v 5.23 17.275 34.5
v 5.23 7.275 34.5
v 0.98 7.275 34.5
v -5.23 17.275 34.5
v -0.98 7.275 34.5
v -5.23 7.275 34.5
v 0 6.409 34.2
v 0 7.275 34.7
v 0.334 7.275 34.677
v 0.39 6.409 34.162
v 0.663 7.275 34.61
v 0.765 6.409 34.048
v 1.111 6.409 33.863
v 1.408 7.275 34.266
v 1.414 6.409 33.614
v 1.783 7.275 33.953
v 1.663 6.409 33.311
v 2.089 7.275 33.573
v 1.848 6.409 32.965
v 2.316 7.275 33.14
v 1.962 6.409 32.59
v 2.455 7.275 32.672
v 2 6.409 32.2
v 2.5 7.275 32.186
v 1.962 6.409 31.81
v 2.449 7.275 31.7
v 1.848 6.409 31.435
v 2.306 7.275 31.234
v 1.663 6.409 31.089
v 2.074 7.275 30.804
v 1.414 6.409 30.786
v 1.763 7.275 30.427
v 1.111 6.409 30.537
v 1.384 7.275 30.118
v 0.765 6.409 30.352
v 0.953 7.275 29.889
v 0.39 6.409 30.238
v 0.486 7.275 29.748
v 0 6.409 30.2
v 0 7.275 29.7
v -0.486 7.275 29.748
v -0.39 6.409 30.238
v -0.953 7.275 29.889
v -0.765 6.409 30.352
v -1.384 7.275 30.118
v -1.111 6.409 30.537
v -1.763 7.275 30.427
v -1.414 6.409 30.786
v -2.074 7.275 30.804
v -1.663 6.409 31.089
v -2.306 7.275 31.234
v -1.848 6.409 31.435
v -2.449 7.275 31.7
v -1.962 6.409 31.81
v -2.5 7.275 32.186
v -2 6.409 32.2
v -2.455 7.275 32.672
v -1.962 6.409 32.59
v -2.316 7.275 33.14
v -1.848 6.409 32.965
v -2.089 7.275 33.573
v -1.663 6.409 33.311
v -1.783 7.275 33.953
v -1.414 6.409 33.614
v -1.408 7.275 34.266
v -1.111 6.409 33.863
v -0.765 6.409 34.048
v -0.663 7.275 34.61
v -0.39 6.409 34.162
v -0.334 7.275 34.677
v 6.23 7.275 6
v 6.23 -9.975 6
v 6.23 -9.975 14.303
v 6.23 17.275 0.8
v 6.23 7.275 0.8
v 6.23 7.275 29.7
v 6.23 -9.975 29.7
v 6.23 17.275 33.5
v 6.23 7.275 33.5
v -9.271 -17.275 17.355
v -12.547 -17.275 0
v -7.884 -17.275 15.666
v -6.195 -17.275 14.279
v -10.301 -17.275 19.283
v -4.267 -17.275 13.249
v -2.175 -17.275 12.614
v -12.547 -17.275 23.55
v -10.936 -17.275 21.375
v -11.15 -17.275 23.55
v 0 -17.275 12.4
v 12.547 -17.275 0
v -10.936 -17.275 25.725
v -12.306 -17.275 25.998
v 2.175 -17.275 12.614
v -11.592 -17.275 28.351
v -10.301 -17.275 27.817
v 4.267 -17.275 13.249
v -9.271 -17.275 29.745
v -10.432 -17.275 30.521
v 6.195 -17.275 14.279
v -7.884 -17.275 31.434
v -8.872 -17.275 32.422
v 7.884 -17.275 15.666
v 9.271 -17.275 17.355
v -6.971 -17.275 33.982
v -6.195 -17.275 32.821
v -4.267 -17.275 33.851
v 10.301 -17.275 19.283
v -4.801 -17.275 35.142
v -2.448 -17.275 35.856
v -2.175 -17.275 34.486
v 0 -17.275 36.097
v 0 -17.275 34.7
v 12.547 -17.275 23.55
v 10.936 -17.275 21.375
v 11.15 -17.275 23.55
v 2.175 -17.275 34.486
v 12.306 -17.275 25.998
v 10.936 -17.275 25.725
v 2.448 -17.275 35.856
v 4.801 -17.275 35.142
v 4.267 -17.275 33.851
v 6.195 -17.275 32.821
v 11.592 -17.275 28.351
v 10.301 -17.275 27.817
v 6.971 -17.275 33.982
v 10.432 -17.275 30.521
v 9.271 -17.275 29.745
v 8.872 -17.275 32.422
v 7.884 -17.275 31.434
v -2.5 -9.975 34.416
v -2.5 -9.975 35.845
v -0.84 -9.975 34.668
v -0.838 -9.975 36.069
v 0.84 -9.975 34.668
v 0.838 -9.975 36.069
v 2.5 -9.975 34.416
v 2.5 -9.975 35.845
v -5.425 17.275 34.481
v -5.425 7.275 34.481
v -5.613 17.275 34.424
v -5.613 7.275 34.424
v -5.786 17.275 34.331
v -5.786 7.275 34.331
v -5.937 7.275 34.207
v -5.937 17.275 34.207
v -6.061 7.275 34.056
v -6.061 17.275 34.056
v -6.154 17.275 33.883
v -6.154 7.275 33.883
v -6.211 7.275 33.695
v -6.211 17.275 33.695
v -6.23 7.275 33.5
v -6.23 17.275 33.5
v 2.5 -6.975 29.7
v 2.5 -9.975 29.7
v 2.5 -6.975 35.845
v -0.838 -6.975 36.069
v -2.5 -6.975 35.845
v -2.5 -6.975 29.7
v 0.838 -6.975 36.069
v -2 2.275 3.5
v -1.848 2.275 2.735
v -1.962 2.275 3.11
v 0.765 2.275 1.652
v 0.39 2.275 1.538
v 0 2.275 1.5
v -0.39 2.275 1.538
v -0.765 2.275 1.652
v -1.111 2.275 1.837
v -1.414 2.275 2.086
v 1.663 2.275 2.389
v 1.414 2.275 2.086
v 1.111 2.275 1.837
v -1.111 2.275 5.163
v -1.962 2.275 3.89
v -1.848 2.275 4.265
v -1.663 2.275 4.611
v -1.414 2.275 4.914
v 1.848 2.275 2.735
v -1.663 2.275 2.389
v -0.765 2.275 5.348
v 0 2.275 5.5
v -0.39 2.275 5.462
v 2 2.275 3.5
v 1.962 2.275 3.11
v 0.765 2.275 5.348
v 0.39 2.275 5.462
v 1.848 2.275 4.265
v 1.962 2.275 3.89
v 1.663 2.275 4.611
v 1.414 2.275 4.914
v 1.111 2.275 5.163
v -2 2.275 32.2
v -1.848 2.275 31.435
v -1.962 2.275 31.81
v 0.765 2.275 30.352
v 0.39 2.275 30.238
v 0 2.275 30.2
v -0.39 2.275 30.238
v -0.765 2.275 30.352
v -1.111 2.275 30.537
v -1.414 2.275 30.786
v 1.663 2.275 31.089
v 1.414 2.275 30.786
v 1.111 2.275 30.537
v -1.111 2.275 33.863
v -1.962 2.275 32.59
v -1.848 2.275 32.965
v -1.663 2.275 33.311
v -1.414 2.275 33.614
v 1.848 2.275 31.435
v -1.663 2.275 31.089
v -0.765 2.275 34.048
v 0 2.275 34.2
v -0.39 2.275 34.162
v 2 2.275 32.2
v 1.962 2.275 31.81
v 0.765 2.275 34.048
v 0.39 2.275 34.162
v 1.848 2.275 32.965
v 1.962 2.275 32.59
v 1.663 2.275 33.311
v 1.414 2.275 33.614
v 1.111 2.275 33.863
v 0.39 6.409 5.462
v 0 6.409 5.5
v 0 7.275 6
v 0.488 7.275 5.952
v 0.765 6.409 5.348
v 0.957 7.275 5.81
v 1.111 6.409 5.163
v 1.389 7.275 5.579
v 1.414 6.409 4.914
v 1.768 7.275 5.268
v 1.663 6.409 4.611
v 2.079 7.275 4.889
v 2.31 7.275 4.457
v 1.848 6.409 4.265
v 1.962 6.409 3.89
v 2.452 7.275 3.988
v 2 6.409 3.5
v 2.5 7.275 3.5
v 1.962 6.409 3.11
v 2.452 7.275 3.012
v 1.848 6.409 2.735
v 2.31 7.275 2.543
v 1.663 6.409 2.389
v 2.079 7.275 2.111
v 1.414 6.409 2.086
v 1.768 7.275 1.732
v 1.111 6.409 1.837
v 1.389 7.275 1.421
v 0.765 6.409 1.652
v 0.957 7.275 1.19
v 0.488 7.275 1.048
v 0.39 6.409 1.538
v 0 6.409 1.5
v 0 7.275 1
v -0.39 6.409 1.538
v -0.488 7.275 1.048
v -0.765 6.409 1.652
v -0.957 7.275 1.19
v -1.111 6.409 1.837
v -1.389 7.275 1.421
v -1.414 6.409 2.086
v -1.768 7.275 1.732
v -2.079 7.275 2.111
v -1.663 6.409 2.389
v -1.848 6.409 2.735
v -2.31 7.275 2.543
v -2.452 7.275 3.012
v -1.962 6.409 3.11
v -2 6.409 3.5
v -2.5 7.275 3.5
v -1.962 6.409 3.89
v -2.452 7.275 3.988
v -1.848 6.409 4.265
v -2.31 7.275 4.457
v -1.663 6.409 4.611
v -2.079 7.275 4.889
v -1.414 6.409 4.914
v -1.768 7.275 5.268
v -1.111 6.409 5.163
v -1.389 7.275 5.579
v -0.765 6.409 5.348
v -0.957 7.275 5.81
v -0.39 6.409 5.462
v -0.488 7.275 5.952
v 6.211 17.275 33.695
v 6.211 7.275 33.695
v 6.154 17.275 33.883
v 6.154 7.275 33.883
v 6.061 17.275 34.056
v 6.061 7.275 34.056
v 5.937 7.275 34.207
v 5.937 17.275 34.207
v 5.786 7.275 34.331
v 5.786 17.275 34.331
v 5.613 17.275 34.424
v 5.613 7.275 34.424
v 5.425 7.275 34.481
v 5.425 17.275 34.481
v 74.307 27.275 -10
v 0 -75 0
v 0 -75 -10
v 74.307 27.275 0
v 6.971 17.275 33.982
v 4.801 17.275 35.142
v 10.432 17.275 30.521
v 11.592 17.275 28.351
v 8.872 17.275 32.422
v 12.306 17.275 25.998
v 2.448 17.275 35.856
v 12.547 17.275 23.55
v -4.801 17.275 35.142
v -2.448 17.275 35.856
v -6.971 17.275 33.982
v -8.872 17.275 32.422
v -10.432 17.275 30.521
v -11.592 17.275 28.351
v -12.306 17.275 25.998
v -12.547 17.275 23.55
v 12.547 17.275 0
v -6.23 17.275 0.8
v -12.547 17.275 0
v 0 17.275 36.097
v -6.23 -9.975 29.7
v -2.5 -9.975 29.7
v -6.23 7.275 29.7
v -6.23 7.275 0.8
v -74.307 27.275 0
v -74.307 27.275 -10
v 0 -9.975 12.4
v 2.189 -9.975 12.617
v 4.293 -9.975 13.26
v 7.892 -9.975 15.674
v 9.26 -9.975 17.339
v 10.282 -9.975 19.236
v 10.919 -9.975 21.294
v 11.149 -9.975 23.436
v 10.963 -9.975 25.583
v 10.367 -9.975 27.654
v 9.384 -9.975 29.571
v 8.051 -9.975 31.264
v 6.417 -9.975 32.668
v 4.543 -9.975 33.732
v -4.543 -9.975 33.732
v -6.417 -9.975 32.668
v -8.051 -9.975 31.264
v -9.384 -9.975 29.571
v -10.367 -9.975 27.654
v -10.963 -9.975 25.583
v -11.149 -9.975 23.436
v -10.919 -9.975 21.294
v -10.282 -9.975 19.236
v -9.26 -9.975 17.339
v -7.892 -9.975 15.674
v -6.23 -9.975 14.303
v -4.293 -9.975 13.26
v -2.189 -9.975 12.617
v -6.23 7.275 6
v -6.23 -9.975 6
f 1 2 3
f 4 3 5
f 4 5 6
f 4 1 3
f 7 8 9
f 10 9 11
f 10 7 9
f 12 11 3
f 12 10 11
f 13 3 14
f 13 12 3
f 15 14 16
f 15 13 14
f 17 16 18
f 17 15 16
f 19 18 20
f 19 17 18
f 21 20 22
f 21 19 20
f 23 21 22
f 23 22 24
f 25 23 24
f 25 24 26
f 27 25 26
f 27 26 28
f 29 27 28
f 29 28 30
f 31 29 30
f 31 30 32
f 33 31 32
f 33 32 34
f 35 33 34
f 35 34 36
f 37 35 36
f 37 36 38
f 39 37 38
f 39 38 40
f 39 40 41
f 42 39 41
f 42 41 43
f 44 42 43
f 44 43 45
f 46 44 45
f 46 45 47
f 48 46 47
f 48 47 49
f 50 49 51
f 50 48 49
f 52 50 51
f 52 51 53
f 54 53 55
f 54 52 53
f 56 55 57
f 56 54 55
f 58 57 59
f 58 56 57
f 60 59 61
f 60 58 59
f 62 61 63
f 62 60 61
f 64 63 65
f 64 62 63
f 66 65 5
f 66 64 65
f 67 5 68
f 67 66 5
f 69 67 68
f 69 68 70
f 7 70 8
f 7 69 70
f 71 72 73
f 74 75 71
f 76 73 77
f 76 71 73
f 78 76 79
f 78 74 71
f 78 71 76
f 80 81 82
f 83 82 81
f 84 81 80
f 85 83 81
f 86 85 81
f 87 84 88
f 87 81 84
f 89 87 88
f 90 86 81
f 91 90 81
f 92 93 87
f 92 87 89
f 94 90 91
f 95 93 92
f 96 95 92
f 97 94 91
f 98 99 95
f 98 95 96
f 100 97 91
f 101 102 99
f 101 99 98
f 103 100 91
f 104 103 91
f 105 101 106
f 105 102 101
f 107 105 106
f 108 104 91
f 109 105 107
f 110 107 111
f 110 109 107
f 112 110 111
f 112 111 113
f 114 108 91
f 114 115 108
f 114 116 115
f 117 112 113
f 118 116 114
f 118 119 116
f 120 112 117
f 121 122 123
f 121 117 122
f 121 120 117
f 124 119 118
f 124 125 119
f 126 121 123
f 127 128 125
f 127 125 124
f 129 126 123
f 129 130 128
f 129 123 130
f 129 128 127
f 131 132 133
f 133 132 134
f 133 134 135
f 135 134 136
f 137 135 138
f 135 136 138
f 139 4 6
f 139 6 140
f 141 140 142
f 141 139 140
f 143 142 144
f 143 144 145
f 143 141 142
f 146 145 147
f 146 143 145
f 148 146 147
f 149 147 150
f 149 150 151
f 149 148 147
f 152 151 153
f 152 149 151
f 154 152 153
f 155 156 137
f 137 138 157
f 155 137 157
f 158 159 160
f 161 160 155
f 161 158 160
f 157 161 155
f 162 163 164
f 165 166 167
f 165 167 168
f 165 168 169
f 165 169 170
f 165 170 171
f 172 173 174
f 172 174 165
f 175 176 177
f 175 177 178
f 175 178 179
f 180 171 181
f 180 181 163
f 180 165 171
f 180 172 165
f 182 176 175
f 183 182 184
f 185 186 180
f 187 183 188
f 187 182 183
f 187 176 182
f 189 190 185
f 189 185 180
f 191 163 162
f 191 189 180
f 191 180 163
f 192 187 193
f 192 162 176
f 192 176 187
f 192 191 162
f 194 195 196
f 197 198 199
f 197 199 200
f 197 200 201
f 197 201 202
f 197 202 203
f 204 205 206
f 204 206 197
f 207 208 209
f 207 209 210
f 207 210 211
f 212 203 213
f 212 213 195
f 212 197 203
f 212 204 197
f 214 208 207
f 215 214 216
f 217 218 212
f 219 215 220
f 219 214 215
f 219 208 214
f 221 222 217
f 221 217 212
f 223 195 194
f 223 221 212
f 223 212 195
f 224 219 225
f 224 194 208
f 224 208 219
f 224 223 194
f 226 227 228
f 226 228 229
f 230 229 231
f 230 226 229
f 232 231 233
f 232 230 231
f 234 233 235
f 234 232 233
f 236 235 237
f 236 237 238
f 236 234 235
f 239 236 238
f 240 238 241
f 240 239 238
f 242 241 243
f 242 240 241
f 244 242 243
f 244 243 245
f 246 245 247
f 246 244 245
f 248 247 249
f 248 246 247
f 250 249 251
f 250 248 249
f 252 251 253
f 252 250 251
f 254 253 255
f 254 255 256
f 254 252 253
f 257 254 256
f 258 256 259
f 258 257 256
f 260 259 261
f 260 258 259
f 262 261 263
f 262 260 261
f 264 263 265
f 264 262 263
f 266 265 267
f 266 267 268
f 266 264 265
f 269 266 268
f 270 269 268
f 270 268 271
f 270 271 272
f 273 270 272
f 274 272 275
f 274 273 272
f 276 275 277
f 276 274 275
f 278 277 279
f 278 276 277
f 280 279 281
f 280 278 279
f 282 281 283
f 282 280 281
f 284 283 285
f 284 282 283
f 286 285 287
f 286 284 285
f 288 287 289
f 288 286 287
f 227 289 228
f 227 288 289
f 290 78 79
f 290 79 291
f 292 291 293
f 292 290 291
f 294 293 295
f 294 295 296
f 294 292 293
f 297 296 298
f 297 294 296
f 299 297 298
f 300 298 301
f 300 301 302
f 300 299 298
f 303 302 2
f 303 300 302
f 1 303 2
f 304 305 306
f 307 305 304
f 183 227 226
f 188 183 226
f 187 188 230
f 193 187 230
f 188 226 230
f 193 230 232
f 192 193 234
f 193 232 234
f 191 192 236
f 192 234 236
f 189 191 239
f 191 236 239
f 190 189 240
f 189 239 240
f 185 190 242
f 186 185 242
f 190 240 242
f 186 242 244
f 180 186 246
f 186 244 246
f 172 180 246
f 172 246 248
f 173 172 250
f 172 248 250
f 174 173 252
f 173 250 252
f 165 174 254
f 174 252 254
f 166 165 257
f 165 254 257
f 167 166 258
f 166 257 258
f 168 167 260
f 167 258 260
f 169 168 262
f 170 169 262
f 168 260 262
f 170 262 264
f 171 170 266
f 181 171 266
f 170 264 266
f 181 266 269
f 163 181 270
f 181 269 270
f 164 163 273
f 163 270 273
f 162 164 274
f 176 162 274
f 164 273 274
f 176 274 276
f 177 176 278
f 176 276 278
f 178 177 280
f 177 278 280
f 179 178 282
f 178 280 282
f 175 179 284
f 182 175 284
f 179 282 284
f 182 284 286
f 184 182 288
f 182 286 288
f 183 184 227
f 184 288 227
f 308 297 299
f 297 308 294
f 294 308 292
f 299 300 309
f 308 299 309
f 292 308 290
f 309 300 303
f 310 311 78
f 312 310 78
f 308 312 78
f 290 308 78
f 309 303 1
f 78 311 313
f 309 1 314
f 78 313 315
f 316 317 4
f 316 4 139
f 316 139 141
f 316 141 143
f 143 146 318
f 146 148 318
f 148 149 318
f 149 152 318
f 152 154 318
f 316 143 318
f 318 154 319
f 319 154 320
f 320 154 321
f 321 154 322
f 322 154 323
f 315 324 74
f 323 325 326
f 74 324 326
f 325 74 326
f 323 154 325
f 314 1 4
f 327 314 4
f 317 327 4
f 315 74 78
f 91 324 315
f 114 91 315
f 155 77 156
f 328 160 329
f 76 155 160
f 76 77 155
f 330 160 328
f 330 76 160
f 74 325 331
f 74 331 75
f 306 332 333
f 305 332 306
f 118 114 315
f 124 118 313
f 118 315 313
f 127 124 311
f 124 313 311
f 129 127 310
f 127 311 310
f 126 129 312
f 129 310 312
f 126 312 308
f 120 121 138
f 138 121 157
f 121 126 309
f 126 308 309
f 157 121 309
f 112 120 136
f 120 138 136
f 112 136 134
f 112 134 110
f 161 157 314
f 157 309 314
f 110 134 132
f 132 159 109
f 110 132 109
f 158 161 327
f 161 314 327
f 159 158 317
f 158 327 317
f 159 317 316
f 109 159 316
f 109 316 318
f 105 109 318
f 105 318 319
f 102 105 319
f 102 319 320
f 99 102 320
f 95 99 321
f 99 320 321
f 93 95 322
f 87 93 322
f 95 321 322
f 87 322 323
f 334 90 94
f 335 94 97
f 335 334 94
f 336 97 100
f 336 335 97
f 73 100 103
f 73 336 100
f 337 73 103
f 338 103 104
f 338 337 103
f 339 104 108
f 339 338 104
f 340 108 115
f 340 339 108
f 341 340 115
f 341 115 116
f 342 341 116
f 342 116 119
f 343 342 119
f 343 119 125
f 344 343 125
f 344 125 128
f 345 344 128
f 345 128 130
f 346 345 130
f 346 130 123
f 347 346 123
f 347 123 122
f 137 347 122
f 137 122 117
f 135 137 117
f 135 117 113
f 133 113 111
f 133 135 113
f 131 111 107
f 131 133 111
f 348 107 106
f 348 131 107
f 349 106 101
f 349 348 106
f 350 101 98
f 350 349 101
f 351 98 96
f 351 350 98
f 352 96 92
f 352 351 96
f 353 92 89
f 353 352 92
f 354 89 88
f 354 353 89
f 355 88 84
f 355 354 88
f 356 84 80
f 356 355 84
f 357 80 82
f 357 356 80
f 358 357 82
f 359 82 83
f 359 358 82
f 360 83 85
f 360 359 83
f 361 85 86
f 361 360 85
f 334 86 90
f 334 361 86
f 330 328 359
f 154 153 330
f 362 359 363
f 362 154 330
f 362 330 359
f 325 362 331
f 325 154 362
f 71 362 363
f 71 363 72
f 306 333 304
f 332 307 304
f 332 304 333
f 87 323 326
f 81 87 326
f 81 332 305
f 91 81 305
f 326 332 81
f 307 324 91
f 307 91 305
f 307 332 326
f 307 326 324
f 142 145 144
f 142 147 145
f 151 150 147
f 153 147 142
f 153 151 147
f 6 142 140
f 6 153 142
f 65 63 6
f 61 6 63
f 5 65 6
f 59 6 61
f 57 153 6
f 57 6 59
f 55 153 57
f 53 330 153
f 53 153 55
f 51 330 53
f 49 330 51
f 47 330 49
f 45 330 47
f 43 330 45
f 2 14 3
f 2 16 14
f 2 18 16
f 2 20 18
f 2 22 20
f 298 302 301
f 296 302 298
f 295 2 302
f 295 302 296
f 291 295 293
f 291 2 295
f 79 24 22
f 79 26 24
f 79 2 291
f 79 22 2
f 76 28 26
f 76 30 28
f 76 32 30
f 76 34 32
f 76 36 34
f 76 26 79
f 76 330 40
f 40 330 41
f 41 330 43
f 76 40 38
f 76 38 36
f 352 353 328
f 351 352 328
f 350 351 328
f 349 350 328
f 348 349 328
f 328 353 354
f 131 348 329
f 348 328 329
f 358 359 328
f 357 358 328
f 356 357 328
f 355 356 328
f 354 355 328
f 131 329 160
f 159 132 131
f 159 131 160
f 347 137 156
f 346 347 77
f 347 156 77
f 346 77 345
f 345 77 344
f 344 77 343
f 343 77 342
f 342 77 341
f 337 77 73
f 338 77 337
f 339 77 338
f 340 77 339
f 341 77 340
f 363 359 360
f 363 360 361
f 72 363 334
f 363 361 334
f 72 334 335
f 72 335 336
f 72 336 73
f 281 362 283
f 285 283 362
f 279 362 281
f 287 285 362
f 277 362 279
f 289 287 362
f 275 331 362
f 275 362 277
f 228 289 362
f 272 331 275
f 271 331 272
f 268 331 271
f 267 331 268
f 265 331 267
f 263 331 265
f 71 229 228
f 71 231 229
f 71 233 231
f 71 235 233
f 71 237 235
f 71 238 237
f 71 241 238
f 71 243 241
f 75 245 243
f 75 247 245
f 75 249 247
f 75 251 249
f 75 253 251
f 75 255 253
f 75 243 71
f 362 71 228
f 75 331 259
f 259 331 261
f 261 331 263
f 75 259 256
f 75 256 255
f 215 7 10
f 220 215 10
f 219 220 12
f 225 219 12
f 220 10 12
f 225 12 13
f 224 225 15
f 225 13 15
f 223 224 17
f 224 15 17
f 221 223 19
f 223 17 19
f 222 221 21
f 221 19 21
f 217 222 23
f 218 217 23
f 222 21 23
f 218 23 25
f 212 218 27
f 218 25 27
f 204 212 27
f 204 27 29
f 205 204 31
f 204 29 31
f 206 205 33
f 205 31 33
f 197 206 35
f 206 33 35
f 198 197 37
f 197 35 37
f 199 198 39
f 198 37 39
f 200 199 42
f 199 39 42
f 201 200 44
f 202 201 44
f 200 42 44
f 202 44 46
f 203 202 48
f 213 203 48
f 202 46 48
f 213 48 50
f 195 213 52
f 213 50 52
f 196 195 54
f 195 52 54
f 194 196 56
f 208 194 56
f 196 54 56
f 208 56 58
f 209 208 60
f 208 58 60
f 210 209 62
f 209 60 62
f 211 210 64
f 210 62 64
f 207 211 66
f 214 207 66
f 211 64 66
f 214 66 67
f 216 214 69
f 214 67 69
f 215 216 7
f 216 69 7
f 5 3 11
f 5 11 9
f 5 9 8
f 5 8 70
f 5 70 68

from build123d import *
from OCP.BRepFilletAPI import BRepFilletAPI_MakeChamfer

# Parameters (mm, degrees)
SKETCH4_W                = 12.46
SKETCH4_H                = 17.25
BOSS_EXTRUDE3_DEPTH      = 6
BOSS_EXTRUDE6_DEPTH      = 7.3
BOSS_EXTRUDE6_DEPTH_BACK = 17.25
SKETCH8_R                = 12.546781182
SKETCH8_R_2              = 11.15
BOSS_EXTRUDE4_DEPTH      = 17.25
SKETCH6_R                = 2
CUT_EXTRUDE1_DEPTH       = 5
CHAMFER1_SIZE            = 0.5
CHAMFER1_SIZE_2          = 0.866025404
SKETCH10_W               = 12.46
SKETCH10_H               = 23.7
CUT_EXTRUDE3_DEPTH       = 17.25
CUT_EXTRUDE4_REACH       = 43.938
SKETCH11_W               = 5
SKETCH11_H               = 3
BOSS_EXTRUDE7_START      = -7.3
BOSS_EXTRUDE7_DEPTH      = 7.3
BOSS_EXTRUDE9_START      = 10
BOSS_EXTRUDE9_DEPTH      = 10
OFFSET_R_DEPTH           = 10


with BuildPart() as part:
    # Sketch4 → Boss-Extrude3 (new body)
    with BuildSketch(Plane.XY):
        with Locations((0, -1.35)):
            Rectangle(SKETCH4_W, SKETCH4_H)
    extrude(amount=BOSS_EXTRUDE3_DEPTH)



with BuildPart() as body_2:
    # Sketch8 → Boss-Extrude6 (new, two sides: drawn at the far end of the back side and taken through both)
    with BuildSketch(Plane(origin=(0, -9.975, 0), x_dir=(-1, 0, 0), z_dir=(0, -1, 0)).offset(-BOSS_EXTRUDE6_DEPTH_BACK)):
        with Locations(Location((0, -23.55, 0), (0, 0, 90))):
            Circle(SKETCH8_R)
        with Locations(Location((0, -23.55, 0), (0, 0, 90))):
            Circle(SKETCH8_R_2, mode=Mode.SUBTRACT)
    extrude(amount=BOSS_EXTRUDE6_DEPTH + BOSS_EXTRUDE6_DEPTH_BACK)


with BuildPart() as part_1:
    add(part.part)

    add(body_2.part)  # Boss-Extrude4 merges body 2
    # Sketch5 → Boss-Extrude4 (add)
    with BuildSketch(Plane(origin=(0, 7.275, 0), x_dir=(1, 0, 0), z_dir=(0, 1, 0))):
        with BuildLine():
            Line((12.546781182, -23.55), (12.546781182, 0))
            Line((12.546781182, 0), (6.23, 0))
            Line((6.23, 0), (6.23, -29.7))
            Line((6.23, -29.7), (-6.23, -29.7))
            Line((-6.23, -29.7), (-6.23, 0))
            Line((-6.23, 0), (-12.546781182, 0))
            Line((-12.546781182, 0), (-12.546781182, -23.55))
            ThreePointArc((-12.546781182, -23.55), (0, -36.096781182), (12.546781182, -23.55))
        make_face()
    extrude(amount=-BOSS_EXTRUDE4_DEPTH)

    # Sketch6 → Cut-Extrude1 (cut)
    with BuildSketch(Plane(origin=(0, 7.275, 0), x_dir=(1, 0, 0), z_dir=(0, 1, 0))):
        with Locations(Location((0, -3.5, 0), (0, 0, 270))):
            Circle(SKETCH6_R)
        with Locations(Location((0, -32.2, 0), (0, 0, 270))):
            Circle(SKETCH6_R)
    extrude(amount=-CUT_EXTRUDE1_DEPTH, mode=Mode.SUBTRACT)

    # Chamfer1
    chamfer1_edges_1 = [part_1.edges().sort_by_distance(p)[0] for p in [
        (0, 7.275, 1.5),
    ]]
    chamfer1_side_1 = [part_1.faces().sort_by_distance(p)[0] for p in [
        (0, 7.275, 1.49),
    ]]
    chamfer1_edges_2 = [part_1.edges().sort_by_distance(p)[0] for p in [
        (0, 7.275, 30.2),
    ]]
    chamfer1_side_2 = [part_1.faces().sort_by_distance(p)[0] for p in [
        (0, 7.275, 30.19),
    ]]
    chamfer1 = BRepFilletAPI_MakeChamfer(part_1.part.solid().wrapped)
    for e in chamfer1_edges_1:
        chamfer1.Add(CHAMFER1_SIZE - 0.0001, CHAMFER1_SIZE_2 - 0.0001, e.wrapped, chamfer1_side_1[0].wrapped)
    for e in chamfer1_edges_2:
        chamfer1.Add(CHAMFER1_SIZE - 0.0001, CHAMFER1_SIZE_2 - 0.0001, e.wrapped, chamfer1_side_2[0].wrapped)
    add(Compound.cast(chamfer1.Shape()), mode=Mode.REPLACE)  # a hair under: the kernel refuses the full size

    # Sketch10 → Cut-Extrude3 (cut)
    with BuildSketch(Plane(origin=(0, 7.275, 0), x_dir=(1, 0, 0), z_dir=(0, 1, 0))):
        with Locations((0, -17.85)):
            Rectangle(SKETCH10_W, SKETCH10_H)
    extrude(amount=-CUT_EXTRUDE3_DEPTH, mode=Mode.SUBTRACT)

    # Sketch11 → Cut-Extrude4 (cut, up to next)
    with BuildSketch(Plane.XY.offset(36.096781182), mode=Mode.PRIVATE) as cut_extrude4_sk1:
        with Locations((0, -8.475)):
            Rectangle(SKETCH11_W, SKETCH11_H)
    cut_extrude4_tool1 = extrude(cut_extrude4_sk1.sketch, amount=-CUT_EXTRUDE4_REACH, mode=Mode.PRIVATE) & part_1.part
    add(cut_extrude4_tool1.solids().sort_by_distance((0, -8.475, 36.096781))[0], mode=Mode.SUBTRACT)

    # Sketch13 → Boss-Extrude7 (add)
    with BuildSketch(Plane.XZ.offset(17.275).offset(BOSS_EXTRUDE7_START)):
        with BuildLine():
            Line((-12.546781182, 23.55), (-12.546781182, 0))
            Line((-12.546781182, 0), (12.546781182, 0))
            Line((12.546781182, 0), (12.546781182, 23.55))
            ThreePointArc((12.546781182, 23.55), (0, 11.003218818), (-12.546781182, 23.55))
        make_face()
    extrude(amount=BOSS_EXTRUDE7_DEPTH)

    # Sketch15 → Boss-Extrude9 (add)
    with BuildSketch(Plane(origin=(0, 7.275, 0), x_dir=(1, 0, 0), z_dir=(0, 1, 0)).offset(BOSS_EXTRUDE9_START)):
        with BuildLine():
            Line((-12.546781182, 0), (12.546781182, 0))
            Line((12.546781182, 0), (12.546781182, -23.55))
            ThreePointArc((12.546781182, -23.55), (0, -36.096781182), (-12.546781182, -23.55))
            Line((-12.546781182, -23.55), (-12.546781182, 0))
        make_face()
        with BuildLine():
            Line((-6.23, -0.8), (6.23, -0.8))
            Line((6.23, -0.8), (6.23, -33.5))
            ThreePointArc((6.23, -33.5), (5.937106781, -34.207106781), (5.23, -34.5))
            Line((5.23, -34.5), (-5.23, -34.5))
            ThreePointArc((-5.23, -34.5), (-5.937106781, -34.207106781), (-6.23, -33.5))
            Line((-6.23, -33.5), (-6.23, -0.8))
        make_face(mode=Mode.SUBTRACT)
    extrude(amount=-BOSS_EXTRUDE9_DEPTH)

    # Sketch1 → Offset R (add)
    with BuildSketch(Plane.XY):
        Polygon((0, -75), (74.307137052, 27.275), (-74.307137052, 27.275), align=None)
    extrude(amount=-OFFSET_R_DEPTH)


solid = part_1.part
